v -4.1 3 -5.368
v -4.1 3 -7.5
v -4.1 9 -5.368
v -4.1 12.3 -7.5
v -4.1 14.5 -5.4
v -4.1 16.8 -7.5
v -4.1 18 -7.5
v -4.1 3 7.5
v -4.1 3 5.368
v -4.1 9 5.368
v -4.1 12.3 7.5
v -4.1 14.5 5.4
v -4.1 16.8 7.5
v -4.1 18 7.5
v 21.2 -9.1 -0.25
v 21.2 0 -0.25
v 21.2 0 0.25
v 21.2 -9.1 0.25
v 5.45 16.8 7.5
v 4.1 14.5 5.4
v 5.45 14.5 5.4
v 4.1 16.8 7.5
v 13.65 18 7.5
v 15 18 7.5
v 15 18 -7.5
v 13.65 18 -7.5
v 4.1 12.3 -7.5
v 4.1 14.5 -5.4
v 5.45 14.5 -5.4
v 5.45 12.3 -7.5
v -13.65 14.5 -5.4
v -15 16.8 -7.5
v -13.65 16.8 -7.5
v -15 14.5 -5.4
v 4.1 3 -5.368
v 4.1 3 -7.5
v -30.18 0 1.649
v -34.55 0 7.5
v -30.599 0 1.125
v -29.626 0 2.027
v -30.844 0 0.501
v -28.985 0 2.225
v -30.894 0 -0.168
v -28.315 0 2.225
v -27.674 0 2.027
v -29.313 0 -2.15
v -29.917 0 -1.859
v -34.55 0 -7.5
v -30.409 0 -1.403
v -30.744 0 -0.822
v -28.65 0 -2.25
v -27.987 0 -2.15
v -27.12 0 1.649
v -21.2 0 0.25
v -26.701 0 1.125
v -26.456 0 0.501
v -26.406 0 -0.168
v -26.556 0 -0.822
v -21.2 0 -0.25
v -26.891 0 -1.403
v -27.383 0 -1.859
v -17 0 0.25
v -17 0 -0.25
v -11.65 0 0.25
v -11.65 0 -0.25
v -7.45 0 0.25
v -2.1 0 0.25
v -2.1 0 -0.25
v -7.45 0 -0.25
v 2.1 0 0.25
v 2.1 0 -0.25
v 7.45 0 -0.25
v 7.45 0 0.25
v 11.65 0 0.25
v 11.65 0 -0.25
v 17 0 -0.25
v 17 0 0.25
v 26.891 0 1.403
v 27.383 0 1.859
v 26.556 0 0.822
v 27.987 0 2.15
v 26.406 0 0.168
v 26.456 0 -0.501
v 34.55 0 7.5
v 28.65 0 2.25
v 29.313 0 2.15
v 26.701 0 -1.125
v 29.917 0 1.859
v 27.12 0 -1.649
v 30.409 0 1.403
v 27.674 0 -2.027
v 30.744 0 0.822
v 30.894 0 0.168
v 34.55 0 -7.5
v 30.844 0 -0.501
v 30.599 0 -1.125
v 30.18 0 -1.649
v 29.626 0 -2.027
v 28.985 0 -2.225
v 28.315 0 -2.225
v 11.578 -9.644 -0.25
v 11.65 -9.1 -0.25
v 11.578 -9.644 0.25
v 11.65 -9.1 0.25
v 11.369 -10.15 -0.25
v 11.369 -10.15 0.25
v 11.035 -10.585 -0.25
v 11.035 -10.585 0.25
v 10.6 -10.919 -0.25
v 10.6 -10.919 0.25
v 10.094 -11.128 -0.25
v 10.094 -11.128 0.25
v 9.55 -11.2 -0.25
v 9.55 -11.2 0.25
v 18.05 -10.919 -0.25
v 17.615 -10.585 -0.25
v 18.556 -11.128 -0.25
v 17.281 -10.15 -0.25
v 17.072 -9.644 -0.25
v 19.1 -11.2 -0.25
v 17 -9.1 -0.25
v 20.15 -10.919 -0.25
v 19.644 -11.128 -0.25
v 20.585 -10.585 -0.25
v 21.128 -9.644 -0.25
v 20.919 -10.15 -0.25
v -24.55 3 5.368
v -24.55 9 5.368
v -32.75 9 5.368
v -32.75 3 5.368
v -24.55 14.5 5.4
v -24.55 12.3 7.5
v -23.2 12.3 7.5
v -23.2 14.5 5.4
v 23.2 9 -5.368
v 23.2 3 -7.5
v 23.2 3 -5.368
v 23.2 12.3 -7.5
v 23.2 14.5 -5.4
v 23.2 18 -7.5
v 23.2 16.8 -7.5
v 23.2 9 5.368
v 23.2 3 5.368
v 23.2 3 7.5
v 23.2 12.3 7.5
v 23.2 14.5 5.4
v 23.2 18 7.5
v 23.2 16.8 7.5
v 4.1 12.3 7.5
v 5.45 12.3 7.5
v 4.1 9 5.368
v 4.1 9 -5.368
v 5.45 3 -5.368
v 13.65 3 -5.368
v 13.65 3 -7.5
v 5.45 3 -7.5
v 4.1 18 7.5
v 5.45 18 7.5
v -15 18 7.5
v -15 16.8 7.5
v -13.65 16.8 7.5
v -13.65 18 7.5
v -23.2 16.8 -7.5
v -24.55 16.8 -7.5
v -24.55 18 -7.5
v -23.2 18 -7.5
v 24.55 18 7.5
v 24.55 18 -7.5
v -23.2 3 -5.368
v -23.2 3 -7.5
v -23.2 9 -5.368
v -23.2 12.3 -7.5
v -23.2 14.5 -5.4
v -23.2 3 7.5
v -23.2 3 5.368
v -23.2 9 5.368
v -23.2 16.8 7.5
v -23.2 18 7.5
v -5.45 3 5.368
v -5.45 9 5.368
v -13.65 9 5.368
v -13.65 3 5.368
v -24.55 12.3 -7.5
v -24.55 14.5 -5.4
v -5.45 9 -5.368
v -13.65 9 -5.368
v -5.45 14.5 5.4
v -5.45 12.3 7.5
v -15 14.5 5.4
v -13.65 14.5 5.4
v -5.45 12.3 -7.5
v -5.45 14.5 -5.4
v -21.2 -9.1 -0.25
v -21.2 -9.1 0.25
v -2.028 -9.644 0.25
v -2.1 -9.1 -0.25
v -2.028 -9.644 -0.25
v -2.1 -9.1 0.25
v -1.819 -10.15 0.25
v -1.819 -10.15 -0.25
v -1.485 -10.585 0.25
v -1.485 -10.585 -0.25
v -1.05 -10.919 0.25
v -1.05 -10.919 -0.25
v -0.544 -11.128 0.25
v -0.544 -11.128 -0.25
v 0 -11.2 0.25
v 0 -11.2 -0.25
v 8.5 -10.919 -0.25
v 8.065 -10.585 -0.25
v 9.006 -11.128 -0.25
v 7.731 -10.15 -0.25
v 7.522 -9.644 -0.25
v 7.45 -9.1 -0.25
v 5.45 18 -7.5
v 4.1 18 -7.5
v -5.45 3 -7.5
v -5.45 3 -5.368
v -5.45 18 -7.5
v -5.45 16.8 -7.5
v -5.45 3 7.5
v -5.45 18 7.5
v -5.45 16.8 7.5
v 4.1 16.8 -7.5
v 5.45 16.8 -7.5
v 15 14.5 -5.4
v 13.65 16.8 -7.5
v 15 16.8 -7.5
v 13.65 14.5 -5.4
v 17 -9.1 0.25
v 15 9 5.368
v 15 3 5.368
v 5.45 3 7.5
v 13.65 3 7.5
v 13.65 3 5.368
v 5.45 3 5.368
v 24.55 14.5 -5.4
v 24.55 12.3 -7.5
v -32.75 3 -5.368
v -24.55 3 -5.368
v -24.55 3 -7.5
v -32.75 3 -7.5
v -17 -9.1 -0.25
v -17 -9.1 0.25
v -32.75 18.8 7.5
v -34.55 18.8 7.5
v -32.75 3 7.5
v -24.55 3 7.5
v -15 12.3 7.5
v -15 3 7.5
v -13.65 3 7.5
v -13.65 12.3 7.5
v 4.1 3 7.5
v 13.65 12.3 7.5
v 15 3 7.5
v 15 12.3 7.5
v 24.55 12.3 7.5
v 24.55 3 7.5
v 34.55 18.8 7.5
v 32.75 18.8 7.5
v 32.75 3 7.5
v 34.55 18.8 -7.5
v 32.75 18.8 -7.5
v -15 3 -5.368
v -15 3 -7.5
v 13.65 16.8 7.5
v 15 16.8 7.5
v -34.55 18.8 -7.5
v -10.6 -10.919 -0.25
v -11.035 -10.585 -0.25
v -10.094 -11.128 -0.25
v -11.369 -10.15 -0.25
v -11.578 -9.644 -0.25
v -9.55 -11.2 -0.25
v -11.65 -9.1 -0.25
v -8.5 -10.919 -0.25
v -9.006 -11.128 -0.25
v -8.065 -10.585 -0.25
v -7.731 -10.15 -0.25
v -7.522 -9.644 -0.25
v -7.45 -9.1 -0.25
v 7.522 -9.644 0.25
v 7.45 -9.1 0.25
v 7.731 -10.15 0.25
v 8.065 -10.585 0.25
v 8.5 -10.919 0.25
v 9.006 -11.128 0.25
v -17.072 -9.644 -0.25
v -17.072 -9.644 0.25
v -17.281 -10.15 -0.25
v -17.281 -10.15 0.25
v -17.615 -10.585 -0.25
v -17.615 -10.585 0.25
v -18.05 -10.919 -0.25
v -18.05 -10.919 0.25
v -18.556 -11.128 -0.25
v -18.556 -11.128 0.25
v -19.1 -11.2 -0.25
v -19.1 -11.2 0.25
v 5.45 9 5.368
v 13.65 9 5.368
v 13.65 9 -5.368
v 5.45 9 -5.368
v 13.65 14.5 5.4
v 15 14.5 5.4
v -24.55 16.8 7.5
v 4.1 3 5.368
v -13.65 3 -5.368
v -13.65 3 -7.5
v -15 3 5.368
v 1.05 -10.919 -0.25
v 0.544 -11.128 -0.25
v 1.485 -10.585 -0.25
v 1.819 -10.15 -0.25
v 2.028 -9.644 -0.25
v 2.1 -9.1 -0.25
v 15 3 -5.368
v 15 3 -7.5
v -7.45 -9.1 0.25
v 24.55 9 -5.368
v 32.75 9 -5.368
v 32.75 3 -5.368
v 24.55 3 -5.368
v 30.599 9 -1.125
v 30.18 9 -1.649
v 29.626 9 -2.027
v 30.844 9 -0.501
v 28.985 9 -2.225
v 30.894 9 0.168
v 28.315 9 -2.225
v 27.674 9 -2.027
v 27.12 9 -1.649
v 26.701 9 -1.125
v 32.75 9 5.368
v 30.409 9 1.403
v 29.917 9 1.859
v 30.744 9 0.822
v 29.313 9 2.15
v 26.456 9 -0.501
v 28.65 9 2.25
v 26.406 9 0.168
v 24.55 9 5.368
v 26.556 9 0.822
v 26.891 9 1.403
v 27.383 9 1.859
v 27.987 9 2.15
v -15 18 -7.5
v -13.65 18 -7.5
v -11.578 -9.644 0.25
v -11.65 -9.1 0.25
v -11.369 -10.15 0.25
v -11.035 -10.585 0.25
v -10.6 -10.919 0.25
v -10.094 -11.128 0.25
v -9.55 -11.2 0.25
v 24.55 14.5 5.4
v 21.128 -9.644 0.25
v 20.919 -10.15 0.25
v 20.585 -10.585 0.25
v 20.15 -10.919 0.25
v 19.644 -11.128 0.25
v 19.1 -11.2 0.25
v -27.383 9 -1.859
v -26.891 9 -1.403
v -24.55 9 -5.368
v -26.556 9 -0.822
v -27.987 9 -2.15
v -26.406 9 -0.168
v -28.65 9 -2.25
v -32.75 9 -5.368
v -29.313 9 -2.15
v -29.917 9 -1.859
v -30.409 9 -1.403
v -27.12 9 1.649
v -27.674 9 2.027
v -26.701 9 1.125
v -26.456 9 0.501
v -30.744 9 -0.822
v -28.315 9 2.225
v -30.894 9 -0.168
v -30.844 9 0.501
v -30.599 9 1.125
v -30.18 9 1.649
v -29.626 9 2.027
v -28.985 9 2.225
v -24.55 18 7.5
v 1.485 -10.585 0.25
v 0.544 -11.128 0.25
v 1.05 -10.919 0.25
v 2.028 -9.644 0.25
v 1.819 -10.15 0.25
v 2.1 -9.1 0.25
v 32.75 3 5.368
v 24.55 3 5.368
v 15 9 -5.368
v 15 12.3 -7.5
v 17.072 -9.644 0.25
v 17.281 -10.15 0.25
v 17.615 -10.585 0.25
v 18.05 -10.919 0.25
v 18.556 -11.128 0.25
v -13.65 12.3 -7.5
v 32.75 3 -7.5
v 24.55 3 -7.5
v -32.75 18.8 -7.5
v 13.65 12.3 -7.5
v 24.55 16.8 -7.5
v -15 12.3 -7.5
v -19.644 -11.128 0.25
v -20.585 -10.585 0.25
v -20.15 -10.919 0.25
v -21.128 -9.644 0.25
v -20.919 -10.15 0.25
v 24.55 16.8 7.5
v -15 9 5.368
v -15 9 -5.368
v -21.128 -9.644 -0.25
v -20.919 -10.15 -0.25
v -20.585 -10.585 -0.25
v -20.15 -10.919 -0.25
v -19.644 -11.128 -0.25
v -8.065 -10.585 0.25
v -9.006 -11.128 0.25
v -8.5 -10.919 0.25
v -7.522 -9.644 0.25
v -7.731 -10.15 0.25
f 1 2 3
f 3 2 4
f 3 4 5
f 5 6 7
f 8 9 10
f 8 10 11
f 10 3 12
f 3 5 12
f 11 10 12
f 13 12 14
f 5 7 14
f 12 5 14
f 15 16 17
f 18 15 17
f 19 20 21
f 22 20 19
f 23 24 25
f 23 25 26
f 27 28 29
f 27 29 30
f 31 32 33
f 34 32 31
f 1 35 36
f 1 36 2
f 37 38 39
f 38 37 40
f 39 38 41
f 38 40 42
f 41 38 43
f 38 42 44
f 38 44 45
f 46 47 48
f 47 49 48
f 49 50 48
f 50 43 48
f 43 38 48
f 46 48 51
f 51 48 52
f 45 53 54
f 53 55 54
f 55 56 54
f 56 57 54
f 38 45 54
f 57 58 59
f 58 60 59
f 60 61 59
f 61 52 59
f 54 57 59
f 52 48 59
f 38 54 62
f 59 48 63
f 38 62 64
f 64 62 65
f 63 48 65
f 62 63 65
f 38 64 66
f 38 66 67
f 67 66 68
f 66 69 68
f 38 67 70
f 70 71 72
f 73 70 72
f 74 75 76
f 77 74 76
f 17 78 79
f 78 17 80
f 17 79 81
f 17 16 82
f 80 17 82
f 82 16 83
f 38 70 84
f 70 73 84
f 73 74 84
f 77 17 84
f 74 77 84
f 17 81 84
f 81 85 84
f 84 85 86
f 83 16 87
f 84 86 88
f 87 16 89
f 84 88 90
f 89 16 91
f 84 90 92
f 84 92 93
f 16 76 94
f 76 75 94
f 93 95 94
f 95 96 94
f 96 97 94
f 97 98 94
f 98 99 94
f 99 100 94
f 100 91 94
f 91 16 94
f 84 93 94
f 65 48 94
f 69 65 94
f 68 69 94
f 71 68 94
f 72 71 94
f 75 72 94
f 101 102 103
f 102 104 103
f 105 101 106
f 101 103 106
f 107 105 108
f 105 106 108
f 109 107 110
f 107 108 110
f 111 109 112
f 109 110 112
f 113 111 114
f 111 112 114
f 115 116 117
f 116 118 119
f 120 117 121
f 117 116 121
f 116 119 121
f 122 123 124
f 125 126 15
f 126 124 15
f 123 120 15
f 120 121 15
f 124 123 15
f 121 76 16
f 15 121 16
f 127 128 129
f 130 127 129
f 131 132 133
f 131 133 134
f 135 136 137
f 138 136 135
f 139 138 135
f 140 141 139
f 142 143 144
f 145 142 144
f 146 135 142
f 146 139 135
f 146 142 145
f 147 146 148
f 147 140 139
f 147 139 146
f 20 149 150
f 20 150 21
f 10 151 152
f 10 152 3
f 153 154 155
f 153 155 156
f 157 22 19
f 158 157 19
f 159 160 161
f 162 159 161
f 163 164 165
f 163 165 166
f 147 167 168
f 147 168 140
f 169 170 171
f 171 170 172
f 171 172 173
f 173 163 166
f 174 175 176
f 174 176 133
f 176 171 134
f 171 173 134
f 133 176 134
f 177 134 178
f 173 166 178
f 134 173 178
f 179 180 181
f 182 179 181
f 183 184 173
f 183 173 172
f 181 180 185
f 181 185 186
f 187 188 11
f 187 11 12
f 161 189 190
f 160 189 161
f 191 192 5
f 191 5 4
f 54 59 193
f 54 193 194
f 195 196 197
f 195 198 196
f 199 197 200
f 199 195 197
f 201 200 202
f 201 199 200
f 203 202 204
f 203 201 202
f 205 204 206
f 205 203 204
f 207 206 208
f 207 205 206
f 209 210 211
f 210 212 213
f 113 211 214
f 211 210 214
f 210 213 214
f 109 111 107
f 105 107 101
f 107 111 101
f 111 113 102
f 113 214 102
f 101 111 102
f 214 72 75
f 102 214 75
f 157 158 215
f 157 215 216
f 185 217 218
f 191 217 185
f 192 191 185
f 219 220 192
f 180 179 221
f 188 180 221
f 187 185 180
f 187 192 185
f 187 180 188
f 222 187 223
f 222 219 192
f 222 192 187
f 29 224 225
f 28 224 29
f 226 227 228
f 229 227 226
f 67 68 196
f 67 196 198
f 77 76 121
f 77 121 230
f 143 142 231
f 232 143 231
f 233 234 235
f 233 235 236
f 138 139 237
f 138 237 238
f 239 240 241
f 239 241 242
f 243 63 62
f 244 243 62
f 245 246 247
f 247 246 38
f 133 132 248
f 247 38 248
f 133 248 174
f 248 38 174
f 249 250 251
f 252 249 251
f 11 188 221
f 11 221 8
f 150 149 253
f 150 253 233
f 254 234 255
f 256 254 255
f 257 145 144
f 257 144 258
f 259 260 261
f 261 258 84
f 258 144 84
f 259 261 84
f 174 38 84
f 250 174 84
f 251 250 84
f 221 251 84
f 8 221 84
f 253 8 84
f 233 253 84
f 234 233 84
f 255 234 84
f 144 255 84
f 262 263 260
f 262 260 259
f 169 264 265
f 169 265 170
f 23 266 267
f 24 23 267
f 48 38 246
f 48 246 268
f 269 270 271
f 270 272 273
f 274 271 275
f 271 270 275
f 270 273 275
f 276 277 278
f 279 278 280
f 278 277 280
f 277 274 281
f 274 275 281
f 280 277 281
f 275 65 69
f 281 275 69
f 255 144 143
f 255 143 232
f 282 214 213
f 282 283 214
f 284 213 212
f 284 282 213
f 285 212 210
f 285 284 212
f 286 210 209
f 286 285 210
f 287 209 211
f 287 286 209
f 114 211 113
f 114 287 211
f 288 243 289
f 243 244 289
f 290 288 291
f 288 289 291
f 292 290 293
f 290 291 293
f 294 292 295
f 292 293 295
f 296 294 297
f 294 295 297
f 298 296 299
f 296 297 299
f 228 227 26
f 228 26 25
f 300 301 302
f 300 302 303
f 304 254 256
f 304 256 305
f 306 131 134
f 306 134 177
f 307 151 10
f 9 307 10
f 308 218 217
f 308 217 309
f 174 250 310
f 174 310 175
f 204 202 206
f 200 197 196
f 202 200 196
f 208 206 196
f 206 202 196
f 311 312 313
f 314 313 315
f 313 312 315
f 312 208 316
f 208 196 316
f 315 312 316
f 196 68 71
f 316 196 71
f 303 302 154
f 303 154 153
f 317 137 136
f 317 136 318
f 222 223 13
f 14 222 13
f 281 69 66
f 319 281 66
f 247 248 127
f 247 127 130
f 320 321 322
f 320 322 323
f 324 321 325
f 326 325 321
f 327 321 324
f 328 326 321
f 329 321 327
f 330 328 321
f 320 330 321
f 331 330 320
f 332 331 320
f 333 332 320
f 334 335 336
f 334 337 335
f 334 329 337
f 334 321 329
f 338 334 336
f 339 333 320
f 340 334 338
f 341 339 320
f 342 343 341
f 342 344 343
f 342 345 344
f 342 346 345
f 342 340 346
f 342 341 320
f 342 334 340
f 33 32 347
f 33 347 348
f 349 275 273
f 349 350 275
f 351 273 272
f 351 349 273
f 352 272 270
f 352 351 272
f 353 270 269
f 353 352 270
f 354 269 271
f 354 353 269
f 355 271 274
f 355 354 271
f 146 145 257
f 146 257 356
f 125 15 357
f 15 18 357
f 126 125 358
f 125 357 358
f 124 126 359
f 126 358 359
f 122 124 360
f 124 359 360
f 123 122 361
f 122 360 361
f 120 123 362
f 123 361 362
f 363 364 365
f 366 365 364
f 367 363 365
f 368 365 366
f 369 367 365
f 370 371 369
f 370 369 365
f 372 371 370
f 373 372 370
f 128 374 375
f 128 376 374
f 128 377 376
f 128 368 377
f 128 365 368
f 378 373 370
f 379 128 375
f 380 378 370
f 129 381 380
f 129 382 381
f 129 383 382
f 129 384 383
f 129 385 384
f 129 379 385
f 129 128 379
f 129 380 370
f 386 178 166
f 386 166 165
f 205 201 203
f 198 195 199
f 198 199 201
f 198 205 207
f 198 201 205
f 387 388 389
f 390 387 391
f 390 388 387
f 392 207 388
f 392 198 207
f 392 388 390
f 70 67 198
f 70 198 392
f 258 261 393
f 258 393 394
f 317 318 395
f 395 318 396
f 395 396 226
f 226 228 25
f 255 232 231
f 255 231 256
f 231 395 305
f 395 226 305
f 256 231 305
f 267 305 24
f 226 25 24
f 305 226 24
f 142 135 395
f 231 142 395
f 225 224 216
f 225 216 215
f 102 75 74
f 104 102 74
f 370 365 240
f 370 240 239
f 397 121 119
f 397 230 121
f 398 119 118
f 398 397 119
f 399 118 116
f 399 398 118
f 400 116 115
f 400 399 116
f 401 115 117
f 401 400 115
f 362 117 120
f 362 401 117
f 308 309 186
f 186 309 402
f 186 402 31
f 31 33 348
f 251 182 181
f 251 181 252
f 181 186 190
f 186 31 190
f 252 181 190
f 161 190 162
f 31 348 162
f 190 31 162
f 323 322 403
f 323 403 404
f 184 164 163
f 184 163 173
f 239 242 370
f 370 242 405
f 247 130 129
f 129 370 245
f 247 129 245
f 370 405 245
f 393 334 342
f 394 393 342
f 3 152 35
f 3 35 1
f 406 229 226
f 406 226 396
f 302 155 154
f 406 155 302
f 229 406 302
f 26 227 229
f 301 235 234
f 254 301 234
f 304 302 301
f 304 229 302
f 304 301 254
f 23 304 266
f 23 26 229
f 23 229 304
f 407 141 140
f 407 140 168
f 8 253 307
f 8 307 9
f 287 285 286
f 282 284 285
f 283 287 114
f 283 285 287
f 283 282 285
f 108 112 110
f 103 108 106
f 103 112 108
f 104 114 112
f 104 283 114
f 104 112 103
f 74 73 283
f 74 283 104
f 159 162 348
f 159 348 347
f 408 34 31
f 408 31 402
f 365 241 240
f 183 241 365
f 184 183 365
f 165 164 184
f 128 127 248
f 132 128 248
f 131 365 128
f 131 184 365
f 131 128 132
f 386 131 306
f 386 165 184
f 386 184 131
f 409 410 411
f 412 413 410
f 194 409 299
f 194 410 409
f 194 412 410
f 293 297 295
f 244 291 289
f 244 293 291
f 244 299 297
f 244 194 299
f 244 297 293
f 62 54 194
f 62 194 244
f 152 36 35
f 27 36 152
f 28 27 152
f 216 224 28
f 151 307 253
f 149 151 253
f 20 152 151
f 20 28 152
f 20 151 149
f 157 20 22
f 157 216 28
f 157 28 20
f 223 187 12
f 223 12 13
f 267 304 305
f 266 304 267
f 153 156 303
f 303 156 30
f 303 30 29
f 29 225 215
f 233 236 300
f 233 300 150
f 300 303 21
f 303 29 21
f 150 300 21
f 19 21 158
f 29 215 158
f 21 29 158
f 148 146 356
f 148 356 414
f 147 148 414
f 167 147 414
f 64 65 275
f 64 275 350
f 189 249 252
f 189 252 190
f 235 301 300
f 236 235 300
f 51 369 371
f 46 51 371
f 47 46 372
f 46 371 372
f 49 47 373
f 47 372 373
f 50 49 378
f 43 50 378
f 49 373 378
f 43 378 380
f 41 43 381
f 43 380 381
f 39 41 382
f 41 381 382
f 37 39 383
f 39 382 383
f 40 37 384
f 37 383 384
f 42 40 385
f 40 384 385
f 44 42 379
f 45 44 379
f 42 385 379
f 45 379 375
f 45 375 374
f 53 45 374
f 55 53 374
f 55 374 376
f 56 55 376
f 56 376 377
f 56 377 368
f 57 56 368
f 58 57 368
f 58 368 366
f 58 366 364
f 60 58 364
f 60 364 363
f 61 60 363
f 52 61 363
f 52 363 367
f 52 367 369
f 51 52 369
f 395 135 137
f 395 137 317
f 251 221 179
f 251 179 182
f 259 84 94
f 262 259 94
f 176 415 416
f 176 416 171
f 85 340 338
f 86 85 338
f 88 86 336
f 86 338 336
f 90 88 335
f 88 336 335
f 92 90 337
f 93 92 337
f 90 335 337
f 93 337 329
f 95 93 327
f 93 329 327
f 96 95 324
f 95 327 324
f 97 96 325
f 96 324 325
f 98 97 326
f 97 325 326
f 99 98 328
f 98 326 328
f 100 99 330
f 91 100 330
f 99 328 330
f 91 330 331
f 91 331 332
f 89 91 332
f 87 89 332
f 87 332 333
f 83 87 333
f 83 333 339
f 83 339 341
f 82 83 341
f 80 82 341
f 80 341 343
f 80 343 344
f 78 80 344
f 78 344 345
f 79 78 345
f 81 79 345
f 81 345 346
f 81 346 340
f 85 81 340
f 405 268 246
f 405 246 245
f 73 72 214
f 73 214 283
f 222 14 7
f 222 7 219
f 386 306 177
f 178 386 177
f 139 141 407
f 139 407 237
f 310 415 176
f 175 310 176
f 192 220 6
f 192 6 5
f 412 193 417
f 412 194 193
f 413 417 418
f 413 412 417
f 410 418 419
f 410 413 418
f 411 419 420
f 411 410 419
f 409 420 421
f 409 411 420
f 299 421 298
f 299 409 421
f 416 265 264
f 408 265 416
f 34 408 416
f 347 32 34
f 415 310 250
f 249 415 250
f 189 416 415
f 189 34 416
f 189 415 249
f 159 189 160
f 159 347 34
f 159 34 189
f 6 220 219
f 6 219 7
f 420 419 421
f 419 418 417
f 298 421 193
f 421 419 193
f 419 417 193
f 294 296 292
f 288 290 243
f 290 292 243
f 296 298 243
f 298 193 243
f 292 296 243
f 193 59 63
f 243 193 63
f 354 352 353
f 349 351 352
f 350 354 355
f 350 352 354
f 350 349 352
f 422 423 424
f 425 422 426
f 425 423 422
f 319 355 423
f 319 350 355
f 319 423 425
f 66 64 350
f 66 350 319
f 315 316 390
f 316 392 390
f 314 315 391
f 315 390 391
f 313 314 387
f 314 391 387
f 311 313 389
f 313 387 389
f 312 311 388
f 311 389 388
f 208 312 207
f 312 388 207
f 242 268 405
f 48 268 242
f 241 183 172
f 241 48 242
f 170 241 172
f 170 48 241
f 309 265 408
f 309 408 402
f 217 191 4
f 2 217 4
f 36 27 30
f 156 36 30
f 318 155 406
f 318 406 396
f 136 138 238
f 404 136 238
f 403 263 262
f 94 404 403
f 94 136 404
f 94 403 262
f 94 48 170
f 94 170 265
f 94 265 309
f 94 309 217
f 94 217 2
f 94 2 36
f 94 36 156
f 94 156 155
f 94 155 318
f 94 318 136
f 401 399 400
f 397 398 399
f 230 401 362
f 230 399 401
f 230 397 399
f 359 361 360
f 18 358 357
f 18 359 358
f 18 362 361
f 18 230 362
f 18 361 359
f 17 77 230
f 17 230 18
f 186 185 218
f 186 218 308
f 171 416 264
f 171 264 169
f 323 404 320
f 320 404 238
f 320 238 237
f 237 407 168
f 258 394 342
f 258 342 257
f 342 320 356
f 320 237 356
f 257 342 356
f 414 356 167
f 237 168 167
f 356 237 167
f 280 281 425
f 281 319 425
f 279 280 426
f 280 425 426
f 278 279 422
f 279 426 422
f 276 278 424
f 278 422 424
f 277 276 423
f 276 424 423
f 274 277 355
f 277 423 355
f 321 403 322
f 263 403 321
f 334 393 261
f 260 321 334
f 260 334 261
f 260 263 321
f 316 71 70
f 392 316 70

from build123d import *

# Parameters (mm, degrees)
SKETCH_1_W          = 69.1
SKETCH_1_H          = 15
EXTRUDE_1_DEPTH     = 18.8
SKETCH_2_W          = 65.5
SKETCH_2_H          = 15
CUT_EXTRUDE_1_DEPTH = 0.8
SKETCH_4_W          = 8.2
SKETCH_4_H          = 15
CUT_EXTRUDE_2_DEPTH = 9
SKETCH_5_W          = 8.2
SKETCH_5_H          = 2.132429546
CUT_EXTRUDE_3_DEPTH = 15
SKETCH_6_W          = 4.2
SKETCH_6_H          = 0.5
EXTRUDE_2_DEPTH     = 11.2
SKETCH_7_R          = 2.25
CUT_EXTRUDE_4_DEPTH = 41.718454047
CUT_EXTRUDE_START   = -49.1
CUT_EXTRUDE_5_DEPTH = 49.1
FILLET_1_R          = 2.1


with BuildPart() as part:
    # 草图1 → 拉伸1 (new body)
    with BuildSketch(Plane(origin=(0, 0, 0), x_dir=(1, 0, 0), z_dir=(0, 1, 0))):
        Rectangle(SKETCH_1_W, SKETCH_1_H)
    extrude(amount=EXTRUDE_1_DEPTH)

    # 草图2 → 切除-拉伸1 (cut)
    with BuildSketch(Plane(origin=(0, 18.8, 0), x_dir=(-1, 0, 0), z_dir=(0, 1, 0))):
        Rectangle(SKETCH_2_W, SKETCH_2_H)
    extrude(amount=-CUT_EXTRUDE_1_DEPTH, mode=Mode.SUBTRACT)

    # 草图4 → 切除-拉伸2 (cut)
    with BuildSketch(Plane(origin=(0, 18, 0), x_dir=(-1, 0, 0), z_dir=(0, 1, 0))):
        with Locations((-28.65, 0)):
            Rectangle(SKETCH_4_W, SKETCH_4_H)
        with Locations((-19.1, 0)):
            Rectangle(SKETCH_4_W, SKETCH_4_H)
        with Locations((-9.55, 0)):
            Rectangle(SKETCH_4_W, SKETCH_4_H)
        Rectangle(SKETCH_4_W, SKETCH_4_H)
        with Locations((9.55, 0)):
            Rectangle(SKETCH_4_W, SKETCH_4_H)
        with Locations((19.1, 0)):
            Rectangle(SKETCH_4_W, SKETCH_4_H)
        with Locations((28.65, 0)):
            Rectangle(SKETCH_4_W, SKETCH_4_H)
    extrude(amount=-CUT_EXTRUDE_2_DEPTH, mode=Mode.SUBTRACT)

    # 草图5 → 切除-拉伸3 (cut)
    with BuildSketch(Plane(origin=(0, 18, 0), x_dir=(-1, 0, 0), z_dir=(0, 1, 0))):
        with Locations((-28.65, -6.433785227)):
            Rectangle(SKETCH_5_W, SKETCH_5_H)
        with Locations((-28.65, 6.433785227)):
            Rectangle(SKETCH_5_W, SKETCH_5_H)
        with Locations((-19.1, -6.433785227)):
            Rectangle(SKETCH_5_W, SKETCH_5_H)
        with Locations((-19.1, 6.433785227)):
            Rectangle(SKETCH_5_W, SKETCH_5_H)
        with Locations((-9.55, -6.433785227)):
            Rectangle(SKETCH_5_W, SKETCH_5_H)
        with Locations((-9.55, 6.433785227)):
            Rectangle(SKETCH_5_W, SKETCH_5_H)
        with Locations((0, -6.433785227)):
            Rectangle(SKETCH_5_W, SKETCH_5_H)
        with Locations((0, 6.433785227)):
            Rectangle(SKETCH_5_W, SKETCH_5_H)
        with Locations((9.55, -6.433785227)):
            Rectangle(SKETCH_5_W, SKETCH_5_H)
        with Locations((9.55, 6.433785227)):
            Rectangle(SKETCH_5_W, SKETCH_5_H)
        with Locations((19.1, -6.433785227)):
            Rectangle(SKETCH_5_W, SKETCH_5_H)
        with Locations((19.1, 6.433785227)):
            Rectangle(SKETCH_5_W, SKETCH_5_H)
        with Locations((28.65, -6.433785227)):
            Rectangle(SKETCH_5_W, SKETCH_5_H)
        with Locations((28.65, 6.433785227)):
            Rectangle(SKETCH_5_W, SKETCH_5_H)
    extrude(amount=-CUT_EXTRUDE_3_DEPTH, mode=Mode.SUBTRACT)

    # 草图6 → 拉伸2 (add)
    with BuildSketch(Plane.XZ):
        Rectangle(SKETCH_6_W, SKETCH_6_H)
        with Locations((9.55, 0)):
            Rectangle(SKETCH_6_W, SKETCH_6_H)
        with Locations((19.1, 0)):
            Rectangle(SKETCH_6_W, SKETCH_6_H)
        with Locations((-9.55, 0)):
            Rectangle(SKETCH_6_W, SKETCH_6_H)
        with Locations((-19.1, 0)):
            Rectangle(SKETCH_6_W, SKETCH_6_H)
    extrude(amount=EXTRUDE_2_DEPTH)

    # 草图7 → 切除-拉伸4 (cut, through all)
    with BuildSketch(Plane(origin=(0, 9, 0), x_dir=(-1, 0, 0), z_dir=(0, 1, 0))):
        with Locations(Location((-28.65, 0, 0), (0, 0, 90))):
            Circle(SKETCH_7_R)
        with Locations(Location((28.65, 0, 0), (0, 0, 270))):
            Circle(SKETCH_7_R)
    extrude(amount=-CUT_EXTRUDE_4_DEPTH, mode=Mode.SUBTRACT)

    # 草图8 → 切除-拉伸5 (cut)
    with BuildSketch(Plane(origin=(24.55, 0, 0), x_dir=(0, 0, -1), z_dir=(1, 0, 0)).offset(CUT_EXTRUDE_START)):
        Polygon((7.5, 16.8), (5.4, 14.5), (7.5, 12.3), align=None)
        Polygon((-7.5, 16.8), (-7.5, 12.3), (-5.4, 14.5), align=None)
    extrude(amount=CUT_EXTRUDE_5_DEPTH, mode=Mode.SUBTRACT)

    # 圆角1
    fillet_1_edges = [part.edges().sort_by_distance(p)[0] for p in [
        (-21.2, -11.2, 0),
        (21.2, -11.2, 0),
        (17, -11.2, 0),
        (11.65, -11.2, 0),
        (7.45, -11.2, 0),
        (-2.1, -11.2, 0),
        (2.1, -11.2, 0),
        (-7.45, -11.2, 0),
        (-11.65, -11.2, 0),
        (-17, -11.2, 0),
    ]]
    fillet(fillet_1_edges, radius=FILLET_1_R - 0.0001)  # a hair under: the kernel refuses the full size


solid = part.part
